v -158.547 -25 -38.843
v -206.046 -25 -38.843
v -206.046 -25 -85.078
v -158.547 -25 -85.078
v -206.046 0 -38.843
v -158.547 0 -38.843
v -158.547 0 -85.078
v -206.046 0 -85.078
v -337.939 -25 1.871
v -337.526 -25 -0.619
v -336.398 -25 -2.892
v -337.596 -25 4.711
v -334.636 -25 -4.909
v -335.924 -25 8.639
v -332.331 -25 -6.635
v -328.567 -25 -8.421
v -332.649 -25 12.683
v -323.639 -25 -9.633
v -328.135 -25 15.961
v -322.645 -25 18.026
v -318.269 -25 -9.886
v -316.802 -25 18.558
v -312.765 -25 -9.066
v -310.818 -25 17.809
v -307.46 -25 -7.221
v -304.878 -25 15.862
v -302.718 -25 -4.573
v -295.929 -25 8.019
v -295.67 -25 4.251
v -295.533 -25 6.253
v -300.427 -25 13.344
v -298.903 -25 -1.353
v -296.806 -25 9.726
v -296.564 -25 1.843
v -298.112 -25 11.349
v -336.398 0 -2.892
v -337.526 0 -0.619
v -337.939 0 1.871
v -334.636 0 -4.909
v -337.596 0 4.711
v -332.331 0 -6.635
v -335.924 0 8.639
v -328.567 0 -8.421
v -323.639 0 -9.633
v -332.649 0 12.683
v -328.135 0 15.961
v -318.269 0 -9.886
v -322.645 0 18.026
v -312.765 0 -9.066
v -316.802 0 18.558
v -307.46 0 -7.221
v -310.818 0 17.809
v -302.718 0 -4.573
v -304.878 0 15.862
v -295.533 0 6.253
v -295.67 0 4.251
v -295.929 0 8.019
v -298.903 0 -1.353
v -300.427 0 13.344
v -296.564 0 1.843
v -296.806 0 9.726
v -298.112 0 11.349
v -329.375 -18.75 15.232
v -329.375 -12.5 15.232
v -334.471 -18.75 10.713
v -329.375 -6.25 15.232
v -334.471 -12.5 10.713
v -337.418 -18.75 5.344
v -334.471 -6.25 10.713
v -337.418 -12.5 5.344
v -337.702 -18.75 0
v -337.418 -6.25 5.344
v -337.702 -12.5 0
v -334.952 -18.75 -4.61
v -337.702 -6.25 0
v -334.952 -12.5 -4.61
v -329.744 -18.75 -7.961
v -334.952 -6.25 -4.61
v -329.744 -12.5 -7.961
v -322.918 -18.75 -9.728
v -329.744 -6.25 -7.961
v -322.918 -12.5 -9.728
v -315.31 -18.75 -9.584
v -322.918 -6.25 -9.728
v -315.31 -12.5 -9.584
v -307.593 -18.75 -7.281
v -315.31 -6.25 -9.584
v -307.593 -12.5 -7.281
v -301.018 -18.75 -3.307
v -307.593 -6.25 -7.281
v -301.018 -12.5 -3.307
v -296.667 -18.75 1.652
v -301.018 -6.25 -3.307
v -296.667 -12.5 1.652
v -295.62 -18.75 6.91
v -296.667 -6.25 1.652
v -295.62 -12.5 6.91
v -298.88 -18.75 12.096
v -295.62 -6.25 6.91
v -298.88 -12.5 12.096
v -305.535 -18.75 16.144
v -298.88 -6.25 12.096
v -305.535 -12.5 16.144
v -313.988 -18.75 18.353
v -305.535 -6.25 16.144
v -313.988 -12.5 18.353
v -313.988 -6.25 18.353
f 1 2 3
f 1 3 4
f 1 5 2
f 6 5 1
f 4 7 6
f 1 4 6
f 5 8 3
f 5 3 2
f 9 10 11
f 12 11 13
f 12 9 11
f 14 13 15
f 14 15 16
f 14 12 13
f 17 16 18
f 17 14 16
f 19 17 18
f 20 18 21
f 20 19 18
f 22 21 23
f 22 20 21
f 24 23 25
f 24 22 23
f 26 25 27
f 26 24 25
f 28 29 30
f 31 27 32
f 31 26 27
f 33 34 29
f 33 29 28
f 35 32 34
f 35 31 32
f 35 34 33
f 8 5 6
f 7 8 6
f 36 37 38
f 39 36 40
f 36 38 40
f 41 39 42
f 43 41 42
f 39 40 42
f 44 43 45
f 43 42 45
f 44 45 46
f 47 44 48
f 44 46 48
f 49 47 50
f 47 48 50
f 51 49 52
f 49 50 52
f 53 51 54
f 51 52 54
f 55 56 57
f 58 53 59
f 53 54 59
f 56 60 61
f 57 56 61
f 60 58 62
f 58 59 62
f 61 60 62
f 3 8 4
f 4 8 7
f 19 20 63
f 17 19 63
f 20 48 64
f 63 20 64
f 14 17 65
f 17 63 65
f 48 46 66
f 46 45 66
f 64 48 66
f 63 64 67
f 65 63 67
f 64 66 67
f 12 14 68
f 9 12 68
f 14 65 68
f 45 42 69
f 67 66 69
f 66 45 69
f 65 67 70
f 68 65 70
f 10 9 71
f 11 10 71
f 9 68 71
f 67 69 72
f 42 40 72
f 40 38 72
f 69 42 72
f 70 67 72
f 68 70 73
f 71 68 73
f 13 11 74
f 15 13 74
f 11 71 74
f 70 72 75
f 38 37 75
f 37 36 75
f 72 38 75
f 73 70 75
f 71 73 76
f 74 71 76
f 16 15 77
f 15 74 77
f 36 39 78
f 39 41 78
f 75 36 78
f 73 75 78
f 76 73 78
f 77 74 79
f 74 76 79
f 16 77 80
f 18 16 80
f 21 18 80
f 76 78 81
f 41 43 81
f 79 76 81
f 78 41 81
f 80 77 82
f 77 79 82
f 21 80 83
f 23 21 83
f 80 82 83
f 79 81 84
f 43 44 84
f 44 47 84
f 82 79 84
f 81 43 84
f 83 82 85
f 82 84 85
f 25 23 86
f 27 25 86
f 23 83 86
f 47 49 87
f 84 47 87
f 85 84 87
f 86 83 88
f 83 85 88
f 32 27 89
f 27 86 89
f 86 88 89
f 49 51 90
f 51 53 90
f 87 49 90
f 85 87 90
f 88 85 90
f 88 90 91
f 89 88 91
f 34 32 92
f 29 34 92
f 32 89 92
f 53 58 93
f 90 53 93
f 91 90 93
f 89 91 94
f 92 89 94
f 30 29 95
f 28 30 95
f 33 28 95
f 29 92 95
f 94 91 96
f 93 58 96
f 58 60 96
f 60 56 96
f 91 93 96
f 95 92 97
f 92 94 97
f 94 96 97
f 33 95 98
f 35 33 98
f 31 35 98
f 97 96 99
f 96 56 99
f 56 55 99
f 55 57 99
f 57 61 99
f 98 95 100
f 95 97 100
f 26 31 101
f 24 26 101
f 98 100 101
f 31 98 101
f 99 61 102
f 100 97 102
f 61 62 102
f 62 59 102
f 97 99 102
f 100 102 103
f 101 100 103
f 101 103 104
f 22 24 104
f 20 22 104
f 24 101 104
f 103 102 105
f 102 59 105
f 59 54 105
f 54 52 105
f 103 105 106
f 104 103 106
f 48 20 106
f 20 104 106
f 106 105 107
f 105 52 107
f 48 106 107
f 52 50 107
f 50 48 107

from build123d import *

# Parameters (mm, degrees)
F0_W     = 47.4986881018
F0_H     = 46.2349280715
F1_DEPTH = 25
F3_DEPTH = 25


with BuildPart() as f1:
    # F0 (on Front) → F1 (new body)
    with BuildSketch(Plane.XZ):
        with Locations((-182.2966858745, -61.9604699314)):
            Rectangle(F0_W, F0_H)
    extrude(amount=F1_DEPTH)


with BuildPart() as f3:
    # F2 (on Front) → F3 (new body)
    with BuildSketch(Plane.XZ):
        with BuildLine():
            add(Edge.make_bspline(
                [(-322.645008564, 18.0257074535), (-332.4785618301, 15.8396644121), (-346.3020783808, -2.5695494395), (-314.8767104353, -15.6610055658), (-283.2294814858, 8.4710992198), (-311.6764122248, 20.4640756661), (-322.645008564, 18.0257074535)],
                knots=[0, 0, 0, 0, 0.2392613253, 0.4829139559, 0.73312181, 1, 1, 1, 1], degree=3))
        make_face()
    extrude(amount=F3_DEPTH)


solid = Compound([f1.part, f3.part])
